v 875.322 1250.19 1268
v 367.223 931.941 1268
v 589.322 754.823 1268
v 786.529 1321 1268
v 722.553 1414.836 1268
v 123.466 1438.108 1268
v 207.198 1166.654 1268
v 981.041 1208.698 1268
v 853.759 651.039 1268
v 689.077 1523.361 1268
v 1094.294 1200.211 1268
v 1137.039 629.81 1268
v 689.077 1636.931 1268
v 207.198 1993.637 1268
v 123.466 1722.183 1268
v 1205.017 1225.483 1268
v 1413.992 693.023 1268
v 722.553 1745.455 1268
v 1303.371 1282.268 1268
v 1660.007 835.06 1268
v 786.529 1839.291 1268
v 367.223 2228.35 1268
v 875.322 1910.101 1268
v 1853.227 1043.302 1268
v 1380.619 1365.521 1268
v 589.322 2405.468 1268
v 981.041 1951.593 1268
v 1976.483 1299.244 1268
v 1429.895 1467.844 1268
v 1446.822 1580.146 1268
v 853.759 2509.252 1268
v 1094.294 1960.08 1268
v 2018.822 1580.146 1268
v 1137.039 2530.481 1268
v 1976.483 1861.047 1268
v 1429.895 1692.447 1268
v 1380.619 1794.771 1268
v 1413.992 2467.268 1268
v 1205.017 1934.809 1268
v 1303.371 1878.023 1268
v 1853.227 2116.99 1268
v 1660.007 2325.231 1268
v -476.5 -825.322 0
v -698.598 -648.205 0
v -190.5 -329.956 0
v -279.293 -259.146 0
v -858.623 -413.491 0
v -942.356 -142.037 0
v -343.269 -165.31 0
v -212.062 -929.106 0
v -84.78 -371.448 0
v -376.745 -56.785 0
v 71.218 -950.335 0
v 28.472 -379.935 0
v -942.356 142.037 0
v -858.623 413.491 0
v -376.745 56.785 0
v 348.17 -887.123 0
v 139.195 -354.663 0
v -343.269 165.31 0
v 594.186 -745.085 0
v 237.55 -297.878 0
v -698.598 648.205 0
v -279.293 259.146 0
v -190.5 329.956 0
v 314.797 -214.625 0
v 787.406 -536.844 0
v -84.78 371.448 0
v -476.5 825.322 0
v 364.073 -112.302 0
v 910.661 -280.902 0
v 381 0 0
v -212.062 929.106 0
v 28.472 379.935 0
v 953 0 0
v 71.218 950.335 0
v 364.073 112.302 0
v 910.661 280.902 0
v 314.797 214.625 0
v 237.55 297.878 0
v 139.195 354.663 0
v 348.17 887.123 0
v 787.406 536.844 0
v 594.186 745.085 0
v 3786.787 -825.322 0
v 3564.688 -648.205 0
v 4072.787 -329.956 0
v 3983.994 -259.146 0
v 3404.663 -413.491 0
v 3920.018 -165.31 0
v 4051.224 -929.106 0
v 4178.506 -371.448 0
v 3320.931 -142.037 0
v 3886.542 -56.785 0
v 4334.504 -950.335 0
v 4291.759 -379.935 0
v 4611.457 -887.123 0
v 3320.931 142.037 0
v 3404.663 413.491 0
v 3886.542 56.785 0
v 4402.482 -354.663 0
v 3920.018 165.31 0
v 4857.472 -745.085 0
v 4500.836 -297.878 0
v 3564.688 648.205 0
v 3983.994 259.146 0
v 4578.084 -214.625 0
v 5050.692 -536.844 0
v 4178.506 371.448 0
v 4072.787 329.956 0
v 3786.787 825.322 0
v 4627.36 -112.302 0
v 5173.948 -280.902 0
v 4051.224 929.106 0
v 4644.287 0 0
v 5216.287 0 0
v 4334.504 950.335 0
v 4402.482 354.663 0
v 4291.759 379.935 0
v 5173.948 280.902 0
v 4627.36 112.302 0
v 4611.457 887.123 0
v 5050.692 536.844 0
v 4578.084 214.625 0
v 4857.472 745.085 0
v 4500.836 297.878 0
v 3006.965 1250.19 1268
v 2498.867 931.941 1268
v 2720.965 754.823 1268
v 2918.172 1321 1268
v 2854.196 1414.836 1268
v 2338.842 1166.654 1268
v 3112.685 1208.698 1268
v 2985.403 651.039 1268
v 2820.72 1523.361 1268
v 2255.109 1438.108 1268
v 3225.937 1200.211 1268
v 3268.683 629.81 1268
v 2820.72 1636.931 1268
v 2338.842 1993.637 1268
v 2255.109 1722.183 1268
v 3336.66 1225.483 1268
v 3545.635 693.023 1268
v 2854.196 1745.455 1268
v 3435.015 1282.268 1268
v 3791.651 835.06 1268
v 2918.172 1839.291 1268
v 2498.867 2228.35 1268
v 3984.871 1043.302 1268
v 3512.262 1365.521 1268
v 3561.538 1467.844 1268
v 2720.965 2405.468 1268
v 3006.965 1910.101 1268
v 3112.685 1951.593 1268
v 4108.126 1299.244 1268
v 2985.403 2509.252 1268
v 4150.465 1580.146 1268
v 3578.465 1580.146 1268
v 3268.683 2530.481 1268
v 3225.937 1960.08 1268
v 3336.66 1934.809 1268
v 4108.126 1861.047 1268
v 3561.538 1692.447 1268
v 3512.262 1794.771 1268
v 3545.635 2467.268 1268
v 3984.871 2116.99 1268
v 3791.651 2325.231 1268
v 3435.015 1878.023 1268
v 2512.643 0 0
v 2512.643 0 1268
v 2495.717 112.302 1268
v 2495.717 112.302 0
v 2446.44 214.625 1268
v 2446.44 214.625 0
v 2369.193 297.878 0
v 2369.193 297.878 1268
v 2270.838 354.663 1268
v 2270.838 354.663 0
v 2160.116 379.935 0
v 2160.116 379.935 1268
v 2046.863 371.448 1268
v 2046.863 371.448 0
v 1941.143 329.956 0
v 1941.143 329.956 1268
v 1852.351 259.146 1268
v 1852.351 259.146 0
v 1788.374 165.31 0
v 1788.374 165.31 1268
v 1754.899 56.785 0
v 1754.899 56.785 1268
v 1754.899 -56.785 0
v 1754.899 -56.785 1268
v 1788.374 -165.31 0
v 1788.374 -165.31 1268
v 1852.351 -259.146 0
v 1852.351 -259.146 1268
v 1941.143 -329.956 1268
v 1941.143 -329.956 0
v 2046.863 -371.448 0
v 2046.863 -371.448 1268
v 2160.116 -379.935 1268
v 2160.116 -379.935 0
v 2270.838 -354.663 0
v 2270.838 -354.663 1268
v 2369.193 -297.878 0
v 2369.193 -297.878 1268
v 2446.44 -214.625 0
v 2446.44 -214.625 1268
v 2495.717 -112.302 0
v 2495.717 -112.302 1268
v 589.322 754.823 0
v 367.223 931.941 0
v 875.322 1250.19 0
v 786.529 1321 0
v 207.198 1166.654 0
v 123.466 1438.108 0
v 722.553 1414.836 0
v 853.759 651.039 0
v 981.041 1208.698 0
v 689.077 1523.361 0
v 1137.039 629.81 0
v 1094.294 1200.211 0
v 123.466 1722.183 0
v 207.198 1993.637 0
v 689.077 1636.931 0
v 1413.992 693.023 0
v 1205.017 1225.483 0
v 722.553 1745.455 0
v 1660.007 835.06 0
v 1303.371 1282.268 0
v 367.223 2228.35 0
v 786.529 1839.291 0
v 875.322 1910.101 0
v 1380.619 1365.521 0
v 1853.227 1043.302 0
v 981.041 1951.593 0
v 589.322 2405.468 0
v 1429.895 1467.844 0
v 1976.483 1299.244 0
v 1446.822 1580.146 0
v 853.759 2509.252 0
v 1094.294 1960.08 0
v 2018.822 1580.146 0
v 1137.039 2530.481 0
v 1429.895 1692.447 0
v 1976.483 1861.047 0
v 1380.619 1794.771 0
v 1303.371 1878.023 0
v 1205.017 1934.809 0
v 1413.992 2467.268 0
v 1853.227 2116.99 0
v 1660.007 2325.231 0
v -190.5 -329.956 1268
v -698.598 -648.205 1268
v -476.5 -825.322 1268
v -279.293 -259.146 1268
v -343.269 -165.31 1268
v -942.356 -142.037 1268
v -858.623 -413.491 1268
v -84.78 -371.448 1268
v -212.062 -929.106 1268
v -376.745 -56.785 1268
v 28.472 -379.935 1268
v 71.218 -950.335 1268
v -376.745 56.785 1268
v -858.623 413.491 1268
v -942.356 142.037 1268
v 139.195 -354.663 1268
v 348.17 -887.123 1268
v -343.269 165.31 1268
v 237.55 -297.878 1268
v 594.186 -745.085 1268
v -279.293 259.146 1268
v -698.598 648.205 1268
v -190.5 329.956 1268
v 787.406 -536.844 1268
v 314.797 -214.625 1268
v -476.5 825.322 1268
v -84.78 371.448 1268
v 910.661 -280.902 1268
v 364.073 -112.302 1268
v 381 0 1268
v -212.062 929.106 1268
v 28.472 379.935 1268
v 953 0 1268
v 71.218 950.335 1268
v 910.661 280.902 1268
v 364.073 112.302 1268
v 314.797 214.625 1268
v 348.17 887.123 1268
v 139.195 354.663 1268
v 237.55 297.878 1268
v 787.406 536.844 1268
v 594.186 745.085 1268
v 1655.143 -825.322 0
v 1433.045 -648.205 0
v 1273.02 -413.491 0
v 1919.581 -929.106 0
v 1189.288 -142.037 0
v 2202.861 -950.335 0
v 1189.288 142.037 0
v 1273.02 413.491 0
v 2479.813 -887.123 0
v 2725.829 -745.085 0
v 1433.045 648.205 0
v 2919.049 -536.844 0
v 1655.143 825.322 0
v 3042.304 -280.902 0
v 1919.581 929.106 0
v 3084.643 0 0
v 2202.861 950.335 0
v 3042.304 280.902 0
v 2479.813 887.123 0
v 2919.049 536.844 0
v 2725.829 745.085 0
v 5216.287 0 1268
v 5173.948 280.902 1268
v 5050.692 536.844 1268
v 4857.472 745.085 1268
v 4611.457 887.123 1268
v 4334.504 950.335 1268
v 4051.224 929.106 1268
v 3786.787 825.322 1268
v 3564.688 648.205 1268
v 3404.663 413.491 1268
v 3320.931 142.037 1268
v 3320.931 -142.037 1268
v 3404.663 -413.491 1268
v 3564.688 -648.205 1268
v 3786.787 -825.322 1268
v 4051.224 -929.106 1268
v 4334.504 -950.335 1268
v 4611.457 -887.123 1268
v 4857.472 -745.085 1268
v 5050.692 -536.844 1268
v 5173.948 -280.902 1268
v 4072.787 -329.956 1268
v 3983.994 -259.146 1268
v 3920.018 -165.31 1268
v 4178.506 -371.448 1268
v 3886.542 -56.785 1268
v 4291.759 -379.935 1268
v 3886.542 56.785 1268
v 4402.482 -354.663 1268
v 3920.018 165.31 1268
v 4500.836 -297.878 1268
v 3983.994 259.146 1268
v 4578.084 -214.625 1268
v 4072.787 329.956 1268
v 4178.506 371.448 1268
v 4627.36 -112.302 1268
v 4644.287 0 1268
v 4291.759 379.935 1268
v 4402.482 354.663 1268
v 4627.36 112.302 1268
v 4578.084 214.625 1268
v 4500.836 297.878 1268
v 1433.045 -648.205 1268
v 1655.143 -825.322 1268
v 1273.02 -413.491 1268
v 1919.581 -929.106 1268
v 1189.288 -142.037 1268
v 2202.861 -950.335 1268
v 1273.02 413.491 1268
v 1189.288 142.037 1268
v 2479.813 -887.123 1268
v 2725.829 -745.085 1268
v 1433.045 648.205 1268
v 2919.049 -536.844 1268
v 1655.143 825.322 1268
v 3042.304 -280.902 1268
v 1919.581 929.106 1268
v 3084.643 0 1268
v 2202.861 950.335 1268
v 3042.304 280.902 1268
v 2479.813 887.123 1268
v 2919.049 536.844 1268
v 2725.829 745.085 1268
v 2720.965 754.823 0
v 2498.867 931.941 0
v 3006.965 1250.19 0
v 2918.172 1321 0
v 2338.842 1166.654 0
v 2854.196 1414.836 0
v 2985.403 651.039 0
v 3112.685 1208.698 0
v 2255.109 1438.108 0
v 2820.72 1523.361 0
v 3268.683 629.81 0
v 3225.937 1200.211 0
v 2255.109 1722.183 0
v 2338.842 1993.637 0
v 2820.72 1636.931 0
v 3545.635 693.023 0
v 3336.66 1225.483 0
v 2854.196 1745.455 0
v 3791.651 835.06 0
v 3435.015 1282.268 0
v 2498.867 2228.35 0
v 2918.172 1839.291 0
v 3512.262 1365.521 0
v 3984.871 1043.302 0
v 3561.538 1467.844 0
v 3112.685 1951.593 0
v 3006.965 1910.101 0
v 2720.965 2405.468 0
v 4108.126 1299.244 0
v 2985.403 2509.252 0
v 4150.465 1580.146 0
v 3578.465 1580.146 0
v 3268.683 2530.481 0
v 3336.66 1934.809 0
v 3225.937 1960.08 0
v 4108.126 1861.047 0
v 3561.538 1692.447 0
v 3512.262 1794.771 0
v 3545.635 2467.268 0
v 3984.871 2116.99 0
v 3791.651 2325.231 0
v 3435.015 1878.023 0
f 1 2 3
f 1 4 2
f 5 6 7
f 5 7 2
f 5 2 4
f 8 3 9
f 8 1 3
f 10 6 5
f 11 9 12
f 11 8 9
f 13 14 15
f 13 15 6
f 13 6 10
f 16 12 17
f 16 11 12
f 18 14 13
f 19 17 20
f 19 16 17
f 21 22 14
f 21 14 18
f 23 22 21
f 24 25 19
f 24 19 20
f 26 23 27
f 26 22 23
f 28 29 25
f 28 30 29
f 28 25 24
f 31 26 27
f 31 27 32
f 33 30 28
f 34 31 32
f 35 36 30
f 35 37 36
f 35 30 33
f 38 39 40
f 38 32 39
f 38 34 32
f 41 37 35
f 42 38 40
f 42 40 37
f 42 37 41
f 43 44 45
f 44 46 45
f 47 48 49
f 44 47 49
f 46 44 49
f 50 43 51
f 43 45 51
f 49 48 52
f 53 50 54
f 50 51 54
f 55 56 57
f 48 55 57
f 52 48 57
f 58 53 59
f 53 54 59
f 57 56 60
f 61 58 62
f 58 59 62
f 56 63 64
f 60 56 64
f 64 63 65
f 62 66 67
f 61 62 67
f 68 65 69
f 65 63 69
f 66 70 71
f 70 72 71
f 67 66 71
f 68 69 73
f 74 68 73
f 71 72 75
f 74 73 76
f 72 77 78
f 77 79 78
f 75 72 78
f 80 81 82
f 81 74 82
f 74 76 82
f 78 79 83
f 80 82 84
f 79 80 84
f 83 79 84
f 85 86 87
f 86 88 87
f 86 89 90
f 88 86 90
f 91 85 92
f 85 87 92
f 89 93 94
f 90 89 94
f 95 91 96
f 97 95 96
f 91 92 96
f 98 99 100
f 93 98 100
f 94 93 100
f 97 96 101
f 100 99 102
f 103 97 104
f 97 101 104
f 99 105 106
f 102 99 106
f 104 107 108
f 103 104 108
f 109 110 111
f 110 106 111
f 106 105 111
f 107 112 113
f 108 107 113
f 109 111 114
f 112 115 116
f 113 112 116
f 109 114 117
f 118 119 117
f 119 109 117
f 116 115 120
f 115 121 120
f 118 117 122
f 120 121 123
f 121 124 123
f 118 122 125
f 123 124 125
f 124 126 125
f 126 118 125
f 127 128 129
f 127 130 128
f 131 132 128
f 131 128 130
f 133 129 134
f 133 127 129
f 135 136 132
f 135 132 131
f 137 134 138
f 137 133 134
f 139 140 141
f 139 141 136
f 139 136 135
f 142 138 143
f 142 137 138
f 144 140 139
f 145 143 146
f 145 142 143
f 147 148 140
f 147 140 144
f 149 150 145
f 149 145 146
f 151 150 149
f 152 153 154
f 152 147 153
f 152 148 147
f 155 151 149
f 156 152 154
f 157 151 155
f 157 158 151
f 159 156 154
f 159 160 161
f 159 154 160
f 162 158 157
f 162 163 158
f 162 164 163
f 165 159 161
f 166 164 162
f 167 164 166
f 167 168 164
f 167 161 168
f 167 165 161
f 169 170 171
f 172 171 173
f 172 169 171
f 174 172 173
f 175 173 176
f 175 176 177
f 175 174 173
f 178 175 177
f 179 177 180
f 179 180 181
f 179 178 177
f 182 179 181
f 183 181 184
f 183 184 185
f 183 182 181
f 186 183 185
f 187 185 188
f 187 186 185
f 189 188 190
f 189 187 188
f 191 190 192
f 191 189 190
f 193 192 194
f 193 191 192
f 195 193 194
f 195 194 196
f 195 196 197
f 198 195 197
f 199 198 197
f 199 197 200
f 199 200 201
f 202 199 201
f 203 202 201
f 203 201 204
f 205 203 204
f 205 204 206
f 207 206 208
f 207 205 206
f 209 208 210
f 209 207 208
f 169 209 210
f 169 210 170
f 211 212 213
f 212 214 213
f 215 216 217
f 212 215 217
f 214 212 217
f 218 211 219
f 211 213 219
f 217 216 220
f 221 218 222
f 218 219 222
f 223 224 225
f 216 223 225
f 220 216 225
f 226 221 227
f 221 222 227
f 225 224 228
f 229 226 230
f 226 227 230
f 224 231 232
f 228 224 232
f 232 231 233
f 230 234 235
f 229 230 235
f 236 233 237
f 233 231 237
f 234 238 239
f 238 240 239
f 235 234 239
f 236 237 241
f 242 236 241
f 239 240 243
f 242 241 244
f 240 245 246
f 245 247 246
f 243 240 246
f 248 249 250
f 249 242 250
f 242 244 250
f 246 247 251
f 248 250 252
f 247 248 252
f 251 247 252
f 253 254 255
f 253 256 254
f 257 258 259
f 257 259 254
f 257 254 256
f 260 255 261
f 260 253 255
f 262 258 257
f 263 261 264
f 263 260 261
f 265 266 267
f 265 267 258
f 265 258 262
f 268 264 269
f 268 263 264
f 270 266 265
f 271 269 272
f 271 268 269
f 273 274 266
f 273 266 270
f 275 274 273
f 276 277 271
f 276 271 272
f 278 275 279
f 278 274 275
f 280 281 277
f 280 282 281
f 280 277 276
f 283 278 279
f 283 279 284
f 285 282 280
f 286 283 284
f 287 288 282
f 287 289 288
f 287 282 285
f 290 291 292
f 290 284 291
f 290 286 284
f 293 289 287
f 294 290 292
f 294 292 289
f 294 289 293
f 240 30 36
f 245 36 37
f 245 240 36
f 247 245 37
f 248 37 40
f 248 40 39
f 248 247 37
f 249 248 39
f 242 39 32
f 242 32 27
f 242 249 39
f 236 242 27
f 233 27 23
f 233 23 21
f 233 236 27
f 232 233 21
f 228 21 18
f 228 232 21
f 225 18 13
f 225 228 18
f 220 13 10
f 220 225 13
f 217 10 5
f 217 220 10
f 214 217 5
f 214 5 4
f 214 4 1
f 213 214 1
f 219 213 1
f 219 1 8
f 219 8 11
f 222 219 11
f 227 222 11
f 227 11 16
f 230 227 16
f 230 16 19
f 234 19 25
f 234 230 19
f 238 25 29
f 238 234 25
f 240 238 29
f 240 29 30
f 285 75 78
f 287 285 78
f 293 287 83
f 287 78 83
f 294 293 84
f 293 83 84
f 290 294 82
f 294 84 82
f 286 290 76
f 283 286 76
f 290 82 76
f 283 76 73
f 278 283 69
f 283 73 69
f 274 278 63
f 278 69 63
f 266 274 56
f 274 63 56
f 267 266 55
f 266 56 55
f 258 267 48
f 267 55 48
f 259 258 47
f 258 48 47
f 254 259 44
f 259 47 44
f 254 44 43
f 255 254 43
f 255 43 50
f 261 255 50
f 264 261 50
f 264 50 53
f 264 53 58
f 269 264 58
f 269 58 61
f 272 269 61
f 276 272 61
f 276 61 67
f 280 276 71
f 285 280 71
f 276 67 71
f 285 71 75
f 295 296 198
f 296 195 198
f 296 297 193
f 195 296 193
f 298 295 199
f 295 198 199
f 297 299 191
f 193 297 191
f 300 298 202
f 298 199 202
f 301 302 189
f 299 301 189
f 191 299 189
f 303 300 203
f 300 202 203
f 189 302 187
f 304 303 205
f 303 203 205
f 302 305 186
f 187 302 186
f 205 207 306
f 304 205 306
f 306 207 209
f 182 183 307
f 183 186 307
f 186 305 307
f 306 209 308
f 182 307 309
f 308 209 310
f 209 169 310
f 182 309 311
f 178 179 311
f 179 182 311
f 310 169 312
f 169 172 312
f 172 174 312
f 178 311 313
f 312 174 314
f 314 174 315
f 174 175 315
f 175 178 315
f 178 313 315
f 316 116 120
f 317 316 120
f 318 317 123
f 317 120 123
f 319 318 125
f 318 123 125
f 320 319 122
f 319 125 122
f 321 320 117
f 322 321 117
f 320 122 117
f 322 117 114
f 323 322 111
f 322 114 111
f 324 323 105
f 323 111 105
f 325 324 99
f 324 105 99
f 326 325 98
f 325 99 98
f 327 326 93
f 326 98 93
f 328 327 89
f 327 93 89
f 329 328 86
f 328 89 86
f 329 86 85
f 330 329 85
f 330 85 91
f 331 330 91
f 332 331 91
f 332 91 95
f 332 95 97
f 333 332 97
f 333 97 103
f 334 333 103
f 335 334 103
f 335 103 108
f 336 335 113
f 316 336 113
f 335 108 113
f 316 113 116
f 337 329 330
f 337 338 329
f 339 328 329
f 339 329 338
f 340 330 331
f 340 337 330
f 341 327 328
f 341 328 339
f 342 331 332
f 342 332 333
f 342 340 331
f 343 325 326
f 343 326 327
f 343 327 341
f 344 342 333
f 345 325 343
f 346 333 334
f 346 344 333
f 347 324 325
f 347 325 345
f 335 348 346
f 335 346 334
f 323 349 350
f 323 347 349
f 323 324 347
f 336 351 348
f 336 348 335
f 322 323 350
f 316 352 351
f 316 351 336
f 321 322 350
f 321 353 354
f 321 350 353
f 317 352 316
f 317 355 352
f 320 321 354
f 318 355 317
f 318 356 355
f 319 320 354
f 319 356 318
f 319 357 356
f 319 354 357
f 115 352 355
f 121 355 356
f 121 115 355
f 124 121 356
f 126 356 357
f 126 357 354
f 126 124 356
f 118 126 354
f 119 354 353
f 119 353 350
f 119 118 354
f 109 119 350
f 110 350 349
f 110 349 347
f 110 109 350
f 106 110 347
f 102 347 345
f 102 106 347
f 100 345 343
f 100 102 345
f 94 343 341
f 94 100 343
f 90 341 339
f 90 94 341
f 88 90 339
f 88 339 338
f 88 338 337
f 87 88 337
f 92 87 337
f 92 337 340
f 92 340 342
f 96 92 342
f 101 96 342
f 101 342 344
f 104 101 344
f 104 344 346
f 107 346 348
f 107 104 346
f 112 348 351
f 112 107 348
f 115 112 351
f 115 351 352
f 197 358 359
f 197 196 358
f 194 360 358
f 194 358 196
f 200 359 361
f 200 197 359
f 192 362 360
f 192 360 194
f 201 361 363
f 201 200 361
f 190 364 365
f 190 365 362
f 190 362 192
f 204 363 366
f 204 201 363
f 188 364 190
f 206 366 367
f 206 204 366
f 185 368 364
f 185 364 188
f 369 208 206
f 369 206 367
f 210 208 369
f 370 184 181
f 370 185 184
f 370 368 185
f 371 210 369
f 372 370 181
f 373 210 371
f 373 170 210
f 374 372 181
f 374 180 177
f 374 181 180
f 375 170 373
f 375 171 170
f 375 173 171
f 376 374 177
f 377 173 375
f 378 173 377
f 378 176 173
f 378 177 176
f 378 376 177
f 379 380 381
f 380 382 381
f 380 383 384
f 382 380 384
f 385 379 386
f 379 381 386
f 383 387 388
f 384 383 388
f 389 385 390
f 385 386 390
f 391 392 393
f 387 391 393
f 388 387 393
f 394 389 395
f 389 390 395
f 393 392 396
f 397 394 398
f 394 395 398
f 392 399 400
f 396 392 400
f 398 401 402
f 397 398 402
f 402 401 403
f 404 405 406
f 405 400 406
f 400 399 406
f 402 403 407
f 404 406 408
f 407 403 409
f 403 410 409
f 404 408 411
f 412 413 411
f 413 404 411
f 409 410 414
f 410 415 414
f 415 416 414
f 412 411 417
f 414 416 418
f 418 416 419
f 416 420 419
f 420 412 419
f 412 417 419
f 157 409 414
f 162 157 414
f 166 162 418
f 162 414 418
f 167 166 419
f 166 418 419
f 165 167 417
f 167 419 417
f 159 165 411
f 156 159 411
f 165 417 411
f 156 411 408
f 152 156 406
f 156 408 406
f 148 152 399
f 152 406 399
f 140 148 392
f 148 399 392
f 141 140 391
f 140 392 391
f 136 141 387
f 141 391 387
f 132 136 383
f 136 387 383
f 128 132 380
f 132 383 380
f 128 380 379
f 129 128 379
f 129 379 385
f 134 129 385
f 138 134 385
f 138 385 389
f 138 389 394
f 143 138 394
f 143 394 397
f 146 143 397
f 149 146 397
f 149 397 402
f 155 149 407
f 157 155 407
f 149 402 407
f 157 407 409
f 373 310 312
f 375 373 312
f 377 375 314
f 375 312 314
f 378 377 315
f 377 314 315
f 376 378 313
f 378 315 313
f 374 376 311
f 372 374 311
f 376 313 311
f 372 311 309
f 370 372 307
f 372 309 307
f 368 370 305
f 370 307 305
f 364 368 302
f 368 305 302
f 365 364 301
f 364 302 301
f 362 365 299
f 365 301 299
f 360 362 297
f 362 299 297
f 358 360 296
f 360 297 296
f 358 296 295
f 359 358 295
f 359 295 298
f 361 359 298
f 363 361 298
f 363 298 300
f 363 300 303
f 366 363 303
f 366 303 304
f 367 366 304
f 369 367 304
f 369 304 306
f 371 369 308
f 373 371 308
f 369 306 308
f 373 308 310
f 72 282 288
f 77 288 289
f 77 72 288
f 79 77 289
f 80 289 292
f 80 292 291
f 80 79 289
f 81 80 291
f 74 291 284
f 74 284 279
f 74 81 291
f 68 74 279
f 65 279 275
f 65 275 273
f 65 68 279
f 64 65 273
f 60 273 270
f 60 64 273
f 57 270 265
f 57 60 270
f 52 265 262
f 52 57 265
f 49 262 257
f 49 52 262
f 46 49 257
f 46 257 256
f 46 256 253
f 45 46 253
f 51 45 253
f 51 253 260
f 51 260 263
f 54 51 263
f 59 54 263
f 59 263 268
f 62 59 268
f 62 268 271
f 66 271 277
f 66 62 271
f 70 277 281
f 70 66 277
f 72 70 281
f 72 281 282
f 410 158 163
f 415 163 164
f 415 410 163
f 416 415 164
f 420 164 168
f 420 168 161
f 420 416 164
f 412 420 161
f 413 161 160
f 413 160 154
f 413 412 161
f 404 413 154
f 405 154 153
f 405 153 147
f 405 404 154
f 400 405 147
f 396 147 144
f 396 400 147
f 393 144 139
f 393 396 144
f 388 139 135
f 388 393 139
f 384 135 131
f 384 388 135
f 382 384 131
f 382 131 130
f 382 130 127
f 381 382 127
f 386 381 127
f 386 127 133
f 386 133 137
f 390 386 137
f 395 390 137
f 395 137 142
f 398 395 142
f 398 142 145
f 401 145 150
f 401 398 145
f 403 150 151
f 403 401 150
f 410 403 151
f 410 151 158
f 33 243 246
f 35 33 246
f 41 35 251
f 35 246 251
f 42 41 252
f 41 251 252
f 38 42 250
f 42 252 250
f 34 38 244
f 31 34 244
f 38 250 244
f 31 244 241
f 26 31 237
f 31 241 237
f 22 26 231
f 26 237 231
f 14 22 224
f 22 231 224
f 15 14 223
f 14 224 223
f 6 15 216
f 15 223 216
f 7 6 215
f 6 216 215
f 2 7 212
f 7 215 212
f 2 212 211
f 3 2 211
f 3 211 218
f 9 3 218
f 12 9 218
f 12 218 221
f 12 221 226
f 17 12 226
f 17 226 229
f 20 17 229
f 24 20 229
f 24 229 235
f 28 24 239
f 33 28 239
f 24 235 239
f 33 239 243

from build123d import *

# Parameters (mm, degrees)
SZKIC1_R                      = 953
SZKIC1_R_2                    = 381
DODANIE_WYCI_GNI_CIE2_DEPTH   = 1268
DODANIE_WYCI_GNI_CIE2_2_DEPTH = 1268
DODANIE_WYCI_GNI_CIE2_3_DEPTH = 1268
DODANIE_WYCI_GNI_CIE2_4_DEPTH = 1268
DODANIE_WYCI_GNI_CIE2_5_DEPTH = 1268


with BuildPart() as part:
    # Szkic1 → Dodanie-wyciągnięcie2 (new body)
    with BuildSketch(Plane.XY):
        Circle(SZKIC1_R)
        Circle(SZKIC1_R_2, mode=Mode.SUBTRACT)
    extrude(amount=DODANIE_WYCI_GNI_CIE2_DEPTH)


with BuildPart() as body_2:
    # Szkic1 → Dodanie-wyci_gni_cie2 2 (new body)
    with BuildSketch(Plane.XY):
        with Locations((2131.64334803, 0)):
            Circle(SZKIC1_R)
        with Locations((2131.64334803, 0)):
            Circle(SZKIC1_R_2, mode=Mode.SUBTRACT)
    extrude(amount=DODANIE_WYCI_GNI_CIE2_2_DEPTH)


with BuildPart() as body_3:
    # Szkic1 → Dodanie-wyci_gni_cie2 3 (new body)
    with BuildSketch(Plane.XY):
        with Locations((4263.286696061, 0)):
            Circle(SZKIC1_R)
        with Locations((4263.286696061, 0)):
            Circle(SZKIC1_R_2, mode=Mode.SUBTRACT)
    extrude(amount=DODANIE_WYCI_GNI_CIE2_3_DEPTH)


with BuildPart() as body_4:
    # Szkic1 → Dodanie-wyci_gni_cie2 4 (new body)
    with BuildSketch(Plane.XY):
        with Locations((3197.465022046, 1580.14561329)):
            Circle(SZKIC1_R)
        with Locations((3197.465022046, 1580.14561329)):
            Circle(SZKIC1_R_2, mode=Mode.SUBTRACT)
    extrude(amount=DODANIE_WYCI_GNI_CIE2_4_DEPTH)


with BuildPart() as body_5:
    # Szkic1 → Dodanie-wyci_gni_cie2 5 (new body)
    with BuildSketch(Plane.XY):
        with Locations((1065.821674015, 1580.14561329)):
            Circle(SZKIC1_R)
        with Locations((1065.821674015, 1580.14561329)):
            Circle(SZKIC1_R_2, mode=Mode.SUBTRACT)
    extrude(amount=DODANIE_WYCI_GNI_CIE2_5_DEPTH)


solid = Compound([part.part, body_2.part, body_3.part, body_4.part, body_5.part])
